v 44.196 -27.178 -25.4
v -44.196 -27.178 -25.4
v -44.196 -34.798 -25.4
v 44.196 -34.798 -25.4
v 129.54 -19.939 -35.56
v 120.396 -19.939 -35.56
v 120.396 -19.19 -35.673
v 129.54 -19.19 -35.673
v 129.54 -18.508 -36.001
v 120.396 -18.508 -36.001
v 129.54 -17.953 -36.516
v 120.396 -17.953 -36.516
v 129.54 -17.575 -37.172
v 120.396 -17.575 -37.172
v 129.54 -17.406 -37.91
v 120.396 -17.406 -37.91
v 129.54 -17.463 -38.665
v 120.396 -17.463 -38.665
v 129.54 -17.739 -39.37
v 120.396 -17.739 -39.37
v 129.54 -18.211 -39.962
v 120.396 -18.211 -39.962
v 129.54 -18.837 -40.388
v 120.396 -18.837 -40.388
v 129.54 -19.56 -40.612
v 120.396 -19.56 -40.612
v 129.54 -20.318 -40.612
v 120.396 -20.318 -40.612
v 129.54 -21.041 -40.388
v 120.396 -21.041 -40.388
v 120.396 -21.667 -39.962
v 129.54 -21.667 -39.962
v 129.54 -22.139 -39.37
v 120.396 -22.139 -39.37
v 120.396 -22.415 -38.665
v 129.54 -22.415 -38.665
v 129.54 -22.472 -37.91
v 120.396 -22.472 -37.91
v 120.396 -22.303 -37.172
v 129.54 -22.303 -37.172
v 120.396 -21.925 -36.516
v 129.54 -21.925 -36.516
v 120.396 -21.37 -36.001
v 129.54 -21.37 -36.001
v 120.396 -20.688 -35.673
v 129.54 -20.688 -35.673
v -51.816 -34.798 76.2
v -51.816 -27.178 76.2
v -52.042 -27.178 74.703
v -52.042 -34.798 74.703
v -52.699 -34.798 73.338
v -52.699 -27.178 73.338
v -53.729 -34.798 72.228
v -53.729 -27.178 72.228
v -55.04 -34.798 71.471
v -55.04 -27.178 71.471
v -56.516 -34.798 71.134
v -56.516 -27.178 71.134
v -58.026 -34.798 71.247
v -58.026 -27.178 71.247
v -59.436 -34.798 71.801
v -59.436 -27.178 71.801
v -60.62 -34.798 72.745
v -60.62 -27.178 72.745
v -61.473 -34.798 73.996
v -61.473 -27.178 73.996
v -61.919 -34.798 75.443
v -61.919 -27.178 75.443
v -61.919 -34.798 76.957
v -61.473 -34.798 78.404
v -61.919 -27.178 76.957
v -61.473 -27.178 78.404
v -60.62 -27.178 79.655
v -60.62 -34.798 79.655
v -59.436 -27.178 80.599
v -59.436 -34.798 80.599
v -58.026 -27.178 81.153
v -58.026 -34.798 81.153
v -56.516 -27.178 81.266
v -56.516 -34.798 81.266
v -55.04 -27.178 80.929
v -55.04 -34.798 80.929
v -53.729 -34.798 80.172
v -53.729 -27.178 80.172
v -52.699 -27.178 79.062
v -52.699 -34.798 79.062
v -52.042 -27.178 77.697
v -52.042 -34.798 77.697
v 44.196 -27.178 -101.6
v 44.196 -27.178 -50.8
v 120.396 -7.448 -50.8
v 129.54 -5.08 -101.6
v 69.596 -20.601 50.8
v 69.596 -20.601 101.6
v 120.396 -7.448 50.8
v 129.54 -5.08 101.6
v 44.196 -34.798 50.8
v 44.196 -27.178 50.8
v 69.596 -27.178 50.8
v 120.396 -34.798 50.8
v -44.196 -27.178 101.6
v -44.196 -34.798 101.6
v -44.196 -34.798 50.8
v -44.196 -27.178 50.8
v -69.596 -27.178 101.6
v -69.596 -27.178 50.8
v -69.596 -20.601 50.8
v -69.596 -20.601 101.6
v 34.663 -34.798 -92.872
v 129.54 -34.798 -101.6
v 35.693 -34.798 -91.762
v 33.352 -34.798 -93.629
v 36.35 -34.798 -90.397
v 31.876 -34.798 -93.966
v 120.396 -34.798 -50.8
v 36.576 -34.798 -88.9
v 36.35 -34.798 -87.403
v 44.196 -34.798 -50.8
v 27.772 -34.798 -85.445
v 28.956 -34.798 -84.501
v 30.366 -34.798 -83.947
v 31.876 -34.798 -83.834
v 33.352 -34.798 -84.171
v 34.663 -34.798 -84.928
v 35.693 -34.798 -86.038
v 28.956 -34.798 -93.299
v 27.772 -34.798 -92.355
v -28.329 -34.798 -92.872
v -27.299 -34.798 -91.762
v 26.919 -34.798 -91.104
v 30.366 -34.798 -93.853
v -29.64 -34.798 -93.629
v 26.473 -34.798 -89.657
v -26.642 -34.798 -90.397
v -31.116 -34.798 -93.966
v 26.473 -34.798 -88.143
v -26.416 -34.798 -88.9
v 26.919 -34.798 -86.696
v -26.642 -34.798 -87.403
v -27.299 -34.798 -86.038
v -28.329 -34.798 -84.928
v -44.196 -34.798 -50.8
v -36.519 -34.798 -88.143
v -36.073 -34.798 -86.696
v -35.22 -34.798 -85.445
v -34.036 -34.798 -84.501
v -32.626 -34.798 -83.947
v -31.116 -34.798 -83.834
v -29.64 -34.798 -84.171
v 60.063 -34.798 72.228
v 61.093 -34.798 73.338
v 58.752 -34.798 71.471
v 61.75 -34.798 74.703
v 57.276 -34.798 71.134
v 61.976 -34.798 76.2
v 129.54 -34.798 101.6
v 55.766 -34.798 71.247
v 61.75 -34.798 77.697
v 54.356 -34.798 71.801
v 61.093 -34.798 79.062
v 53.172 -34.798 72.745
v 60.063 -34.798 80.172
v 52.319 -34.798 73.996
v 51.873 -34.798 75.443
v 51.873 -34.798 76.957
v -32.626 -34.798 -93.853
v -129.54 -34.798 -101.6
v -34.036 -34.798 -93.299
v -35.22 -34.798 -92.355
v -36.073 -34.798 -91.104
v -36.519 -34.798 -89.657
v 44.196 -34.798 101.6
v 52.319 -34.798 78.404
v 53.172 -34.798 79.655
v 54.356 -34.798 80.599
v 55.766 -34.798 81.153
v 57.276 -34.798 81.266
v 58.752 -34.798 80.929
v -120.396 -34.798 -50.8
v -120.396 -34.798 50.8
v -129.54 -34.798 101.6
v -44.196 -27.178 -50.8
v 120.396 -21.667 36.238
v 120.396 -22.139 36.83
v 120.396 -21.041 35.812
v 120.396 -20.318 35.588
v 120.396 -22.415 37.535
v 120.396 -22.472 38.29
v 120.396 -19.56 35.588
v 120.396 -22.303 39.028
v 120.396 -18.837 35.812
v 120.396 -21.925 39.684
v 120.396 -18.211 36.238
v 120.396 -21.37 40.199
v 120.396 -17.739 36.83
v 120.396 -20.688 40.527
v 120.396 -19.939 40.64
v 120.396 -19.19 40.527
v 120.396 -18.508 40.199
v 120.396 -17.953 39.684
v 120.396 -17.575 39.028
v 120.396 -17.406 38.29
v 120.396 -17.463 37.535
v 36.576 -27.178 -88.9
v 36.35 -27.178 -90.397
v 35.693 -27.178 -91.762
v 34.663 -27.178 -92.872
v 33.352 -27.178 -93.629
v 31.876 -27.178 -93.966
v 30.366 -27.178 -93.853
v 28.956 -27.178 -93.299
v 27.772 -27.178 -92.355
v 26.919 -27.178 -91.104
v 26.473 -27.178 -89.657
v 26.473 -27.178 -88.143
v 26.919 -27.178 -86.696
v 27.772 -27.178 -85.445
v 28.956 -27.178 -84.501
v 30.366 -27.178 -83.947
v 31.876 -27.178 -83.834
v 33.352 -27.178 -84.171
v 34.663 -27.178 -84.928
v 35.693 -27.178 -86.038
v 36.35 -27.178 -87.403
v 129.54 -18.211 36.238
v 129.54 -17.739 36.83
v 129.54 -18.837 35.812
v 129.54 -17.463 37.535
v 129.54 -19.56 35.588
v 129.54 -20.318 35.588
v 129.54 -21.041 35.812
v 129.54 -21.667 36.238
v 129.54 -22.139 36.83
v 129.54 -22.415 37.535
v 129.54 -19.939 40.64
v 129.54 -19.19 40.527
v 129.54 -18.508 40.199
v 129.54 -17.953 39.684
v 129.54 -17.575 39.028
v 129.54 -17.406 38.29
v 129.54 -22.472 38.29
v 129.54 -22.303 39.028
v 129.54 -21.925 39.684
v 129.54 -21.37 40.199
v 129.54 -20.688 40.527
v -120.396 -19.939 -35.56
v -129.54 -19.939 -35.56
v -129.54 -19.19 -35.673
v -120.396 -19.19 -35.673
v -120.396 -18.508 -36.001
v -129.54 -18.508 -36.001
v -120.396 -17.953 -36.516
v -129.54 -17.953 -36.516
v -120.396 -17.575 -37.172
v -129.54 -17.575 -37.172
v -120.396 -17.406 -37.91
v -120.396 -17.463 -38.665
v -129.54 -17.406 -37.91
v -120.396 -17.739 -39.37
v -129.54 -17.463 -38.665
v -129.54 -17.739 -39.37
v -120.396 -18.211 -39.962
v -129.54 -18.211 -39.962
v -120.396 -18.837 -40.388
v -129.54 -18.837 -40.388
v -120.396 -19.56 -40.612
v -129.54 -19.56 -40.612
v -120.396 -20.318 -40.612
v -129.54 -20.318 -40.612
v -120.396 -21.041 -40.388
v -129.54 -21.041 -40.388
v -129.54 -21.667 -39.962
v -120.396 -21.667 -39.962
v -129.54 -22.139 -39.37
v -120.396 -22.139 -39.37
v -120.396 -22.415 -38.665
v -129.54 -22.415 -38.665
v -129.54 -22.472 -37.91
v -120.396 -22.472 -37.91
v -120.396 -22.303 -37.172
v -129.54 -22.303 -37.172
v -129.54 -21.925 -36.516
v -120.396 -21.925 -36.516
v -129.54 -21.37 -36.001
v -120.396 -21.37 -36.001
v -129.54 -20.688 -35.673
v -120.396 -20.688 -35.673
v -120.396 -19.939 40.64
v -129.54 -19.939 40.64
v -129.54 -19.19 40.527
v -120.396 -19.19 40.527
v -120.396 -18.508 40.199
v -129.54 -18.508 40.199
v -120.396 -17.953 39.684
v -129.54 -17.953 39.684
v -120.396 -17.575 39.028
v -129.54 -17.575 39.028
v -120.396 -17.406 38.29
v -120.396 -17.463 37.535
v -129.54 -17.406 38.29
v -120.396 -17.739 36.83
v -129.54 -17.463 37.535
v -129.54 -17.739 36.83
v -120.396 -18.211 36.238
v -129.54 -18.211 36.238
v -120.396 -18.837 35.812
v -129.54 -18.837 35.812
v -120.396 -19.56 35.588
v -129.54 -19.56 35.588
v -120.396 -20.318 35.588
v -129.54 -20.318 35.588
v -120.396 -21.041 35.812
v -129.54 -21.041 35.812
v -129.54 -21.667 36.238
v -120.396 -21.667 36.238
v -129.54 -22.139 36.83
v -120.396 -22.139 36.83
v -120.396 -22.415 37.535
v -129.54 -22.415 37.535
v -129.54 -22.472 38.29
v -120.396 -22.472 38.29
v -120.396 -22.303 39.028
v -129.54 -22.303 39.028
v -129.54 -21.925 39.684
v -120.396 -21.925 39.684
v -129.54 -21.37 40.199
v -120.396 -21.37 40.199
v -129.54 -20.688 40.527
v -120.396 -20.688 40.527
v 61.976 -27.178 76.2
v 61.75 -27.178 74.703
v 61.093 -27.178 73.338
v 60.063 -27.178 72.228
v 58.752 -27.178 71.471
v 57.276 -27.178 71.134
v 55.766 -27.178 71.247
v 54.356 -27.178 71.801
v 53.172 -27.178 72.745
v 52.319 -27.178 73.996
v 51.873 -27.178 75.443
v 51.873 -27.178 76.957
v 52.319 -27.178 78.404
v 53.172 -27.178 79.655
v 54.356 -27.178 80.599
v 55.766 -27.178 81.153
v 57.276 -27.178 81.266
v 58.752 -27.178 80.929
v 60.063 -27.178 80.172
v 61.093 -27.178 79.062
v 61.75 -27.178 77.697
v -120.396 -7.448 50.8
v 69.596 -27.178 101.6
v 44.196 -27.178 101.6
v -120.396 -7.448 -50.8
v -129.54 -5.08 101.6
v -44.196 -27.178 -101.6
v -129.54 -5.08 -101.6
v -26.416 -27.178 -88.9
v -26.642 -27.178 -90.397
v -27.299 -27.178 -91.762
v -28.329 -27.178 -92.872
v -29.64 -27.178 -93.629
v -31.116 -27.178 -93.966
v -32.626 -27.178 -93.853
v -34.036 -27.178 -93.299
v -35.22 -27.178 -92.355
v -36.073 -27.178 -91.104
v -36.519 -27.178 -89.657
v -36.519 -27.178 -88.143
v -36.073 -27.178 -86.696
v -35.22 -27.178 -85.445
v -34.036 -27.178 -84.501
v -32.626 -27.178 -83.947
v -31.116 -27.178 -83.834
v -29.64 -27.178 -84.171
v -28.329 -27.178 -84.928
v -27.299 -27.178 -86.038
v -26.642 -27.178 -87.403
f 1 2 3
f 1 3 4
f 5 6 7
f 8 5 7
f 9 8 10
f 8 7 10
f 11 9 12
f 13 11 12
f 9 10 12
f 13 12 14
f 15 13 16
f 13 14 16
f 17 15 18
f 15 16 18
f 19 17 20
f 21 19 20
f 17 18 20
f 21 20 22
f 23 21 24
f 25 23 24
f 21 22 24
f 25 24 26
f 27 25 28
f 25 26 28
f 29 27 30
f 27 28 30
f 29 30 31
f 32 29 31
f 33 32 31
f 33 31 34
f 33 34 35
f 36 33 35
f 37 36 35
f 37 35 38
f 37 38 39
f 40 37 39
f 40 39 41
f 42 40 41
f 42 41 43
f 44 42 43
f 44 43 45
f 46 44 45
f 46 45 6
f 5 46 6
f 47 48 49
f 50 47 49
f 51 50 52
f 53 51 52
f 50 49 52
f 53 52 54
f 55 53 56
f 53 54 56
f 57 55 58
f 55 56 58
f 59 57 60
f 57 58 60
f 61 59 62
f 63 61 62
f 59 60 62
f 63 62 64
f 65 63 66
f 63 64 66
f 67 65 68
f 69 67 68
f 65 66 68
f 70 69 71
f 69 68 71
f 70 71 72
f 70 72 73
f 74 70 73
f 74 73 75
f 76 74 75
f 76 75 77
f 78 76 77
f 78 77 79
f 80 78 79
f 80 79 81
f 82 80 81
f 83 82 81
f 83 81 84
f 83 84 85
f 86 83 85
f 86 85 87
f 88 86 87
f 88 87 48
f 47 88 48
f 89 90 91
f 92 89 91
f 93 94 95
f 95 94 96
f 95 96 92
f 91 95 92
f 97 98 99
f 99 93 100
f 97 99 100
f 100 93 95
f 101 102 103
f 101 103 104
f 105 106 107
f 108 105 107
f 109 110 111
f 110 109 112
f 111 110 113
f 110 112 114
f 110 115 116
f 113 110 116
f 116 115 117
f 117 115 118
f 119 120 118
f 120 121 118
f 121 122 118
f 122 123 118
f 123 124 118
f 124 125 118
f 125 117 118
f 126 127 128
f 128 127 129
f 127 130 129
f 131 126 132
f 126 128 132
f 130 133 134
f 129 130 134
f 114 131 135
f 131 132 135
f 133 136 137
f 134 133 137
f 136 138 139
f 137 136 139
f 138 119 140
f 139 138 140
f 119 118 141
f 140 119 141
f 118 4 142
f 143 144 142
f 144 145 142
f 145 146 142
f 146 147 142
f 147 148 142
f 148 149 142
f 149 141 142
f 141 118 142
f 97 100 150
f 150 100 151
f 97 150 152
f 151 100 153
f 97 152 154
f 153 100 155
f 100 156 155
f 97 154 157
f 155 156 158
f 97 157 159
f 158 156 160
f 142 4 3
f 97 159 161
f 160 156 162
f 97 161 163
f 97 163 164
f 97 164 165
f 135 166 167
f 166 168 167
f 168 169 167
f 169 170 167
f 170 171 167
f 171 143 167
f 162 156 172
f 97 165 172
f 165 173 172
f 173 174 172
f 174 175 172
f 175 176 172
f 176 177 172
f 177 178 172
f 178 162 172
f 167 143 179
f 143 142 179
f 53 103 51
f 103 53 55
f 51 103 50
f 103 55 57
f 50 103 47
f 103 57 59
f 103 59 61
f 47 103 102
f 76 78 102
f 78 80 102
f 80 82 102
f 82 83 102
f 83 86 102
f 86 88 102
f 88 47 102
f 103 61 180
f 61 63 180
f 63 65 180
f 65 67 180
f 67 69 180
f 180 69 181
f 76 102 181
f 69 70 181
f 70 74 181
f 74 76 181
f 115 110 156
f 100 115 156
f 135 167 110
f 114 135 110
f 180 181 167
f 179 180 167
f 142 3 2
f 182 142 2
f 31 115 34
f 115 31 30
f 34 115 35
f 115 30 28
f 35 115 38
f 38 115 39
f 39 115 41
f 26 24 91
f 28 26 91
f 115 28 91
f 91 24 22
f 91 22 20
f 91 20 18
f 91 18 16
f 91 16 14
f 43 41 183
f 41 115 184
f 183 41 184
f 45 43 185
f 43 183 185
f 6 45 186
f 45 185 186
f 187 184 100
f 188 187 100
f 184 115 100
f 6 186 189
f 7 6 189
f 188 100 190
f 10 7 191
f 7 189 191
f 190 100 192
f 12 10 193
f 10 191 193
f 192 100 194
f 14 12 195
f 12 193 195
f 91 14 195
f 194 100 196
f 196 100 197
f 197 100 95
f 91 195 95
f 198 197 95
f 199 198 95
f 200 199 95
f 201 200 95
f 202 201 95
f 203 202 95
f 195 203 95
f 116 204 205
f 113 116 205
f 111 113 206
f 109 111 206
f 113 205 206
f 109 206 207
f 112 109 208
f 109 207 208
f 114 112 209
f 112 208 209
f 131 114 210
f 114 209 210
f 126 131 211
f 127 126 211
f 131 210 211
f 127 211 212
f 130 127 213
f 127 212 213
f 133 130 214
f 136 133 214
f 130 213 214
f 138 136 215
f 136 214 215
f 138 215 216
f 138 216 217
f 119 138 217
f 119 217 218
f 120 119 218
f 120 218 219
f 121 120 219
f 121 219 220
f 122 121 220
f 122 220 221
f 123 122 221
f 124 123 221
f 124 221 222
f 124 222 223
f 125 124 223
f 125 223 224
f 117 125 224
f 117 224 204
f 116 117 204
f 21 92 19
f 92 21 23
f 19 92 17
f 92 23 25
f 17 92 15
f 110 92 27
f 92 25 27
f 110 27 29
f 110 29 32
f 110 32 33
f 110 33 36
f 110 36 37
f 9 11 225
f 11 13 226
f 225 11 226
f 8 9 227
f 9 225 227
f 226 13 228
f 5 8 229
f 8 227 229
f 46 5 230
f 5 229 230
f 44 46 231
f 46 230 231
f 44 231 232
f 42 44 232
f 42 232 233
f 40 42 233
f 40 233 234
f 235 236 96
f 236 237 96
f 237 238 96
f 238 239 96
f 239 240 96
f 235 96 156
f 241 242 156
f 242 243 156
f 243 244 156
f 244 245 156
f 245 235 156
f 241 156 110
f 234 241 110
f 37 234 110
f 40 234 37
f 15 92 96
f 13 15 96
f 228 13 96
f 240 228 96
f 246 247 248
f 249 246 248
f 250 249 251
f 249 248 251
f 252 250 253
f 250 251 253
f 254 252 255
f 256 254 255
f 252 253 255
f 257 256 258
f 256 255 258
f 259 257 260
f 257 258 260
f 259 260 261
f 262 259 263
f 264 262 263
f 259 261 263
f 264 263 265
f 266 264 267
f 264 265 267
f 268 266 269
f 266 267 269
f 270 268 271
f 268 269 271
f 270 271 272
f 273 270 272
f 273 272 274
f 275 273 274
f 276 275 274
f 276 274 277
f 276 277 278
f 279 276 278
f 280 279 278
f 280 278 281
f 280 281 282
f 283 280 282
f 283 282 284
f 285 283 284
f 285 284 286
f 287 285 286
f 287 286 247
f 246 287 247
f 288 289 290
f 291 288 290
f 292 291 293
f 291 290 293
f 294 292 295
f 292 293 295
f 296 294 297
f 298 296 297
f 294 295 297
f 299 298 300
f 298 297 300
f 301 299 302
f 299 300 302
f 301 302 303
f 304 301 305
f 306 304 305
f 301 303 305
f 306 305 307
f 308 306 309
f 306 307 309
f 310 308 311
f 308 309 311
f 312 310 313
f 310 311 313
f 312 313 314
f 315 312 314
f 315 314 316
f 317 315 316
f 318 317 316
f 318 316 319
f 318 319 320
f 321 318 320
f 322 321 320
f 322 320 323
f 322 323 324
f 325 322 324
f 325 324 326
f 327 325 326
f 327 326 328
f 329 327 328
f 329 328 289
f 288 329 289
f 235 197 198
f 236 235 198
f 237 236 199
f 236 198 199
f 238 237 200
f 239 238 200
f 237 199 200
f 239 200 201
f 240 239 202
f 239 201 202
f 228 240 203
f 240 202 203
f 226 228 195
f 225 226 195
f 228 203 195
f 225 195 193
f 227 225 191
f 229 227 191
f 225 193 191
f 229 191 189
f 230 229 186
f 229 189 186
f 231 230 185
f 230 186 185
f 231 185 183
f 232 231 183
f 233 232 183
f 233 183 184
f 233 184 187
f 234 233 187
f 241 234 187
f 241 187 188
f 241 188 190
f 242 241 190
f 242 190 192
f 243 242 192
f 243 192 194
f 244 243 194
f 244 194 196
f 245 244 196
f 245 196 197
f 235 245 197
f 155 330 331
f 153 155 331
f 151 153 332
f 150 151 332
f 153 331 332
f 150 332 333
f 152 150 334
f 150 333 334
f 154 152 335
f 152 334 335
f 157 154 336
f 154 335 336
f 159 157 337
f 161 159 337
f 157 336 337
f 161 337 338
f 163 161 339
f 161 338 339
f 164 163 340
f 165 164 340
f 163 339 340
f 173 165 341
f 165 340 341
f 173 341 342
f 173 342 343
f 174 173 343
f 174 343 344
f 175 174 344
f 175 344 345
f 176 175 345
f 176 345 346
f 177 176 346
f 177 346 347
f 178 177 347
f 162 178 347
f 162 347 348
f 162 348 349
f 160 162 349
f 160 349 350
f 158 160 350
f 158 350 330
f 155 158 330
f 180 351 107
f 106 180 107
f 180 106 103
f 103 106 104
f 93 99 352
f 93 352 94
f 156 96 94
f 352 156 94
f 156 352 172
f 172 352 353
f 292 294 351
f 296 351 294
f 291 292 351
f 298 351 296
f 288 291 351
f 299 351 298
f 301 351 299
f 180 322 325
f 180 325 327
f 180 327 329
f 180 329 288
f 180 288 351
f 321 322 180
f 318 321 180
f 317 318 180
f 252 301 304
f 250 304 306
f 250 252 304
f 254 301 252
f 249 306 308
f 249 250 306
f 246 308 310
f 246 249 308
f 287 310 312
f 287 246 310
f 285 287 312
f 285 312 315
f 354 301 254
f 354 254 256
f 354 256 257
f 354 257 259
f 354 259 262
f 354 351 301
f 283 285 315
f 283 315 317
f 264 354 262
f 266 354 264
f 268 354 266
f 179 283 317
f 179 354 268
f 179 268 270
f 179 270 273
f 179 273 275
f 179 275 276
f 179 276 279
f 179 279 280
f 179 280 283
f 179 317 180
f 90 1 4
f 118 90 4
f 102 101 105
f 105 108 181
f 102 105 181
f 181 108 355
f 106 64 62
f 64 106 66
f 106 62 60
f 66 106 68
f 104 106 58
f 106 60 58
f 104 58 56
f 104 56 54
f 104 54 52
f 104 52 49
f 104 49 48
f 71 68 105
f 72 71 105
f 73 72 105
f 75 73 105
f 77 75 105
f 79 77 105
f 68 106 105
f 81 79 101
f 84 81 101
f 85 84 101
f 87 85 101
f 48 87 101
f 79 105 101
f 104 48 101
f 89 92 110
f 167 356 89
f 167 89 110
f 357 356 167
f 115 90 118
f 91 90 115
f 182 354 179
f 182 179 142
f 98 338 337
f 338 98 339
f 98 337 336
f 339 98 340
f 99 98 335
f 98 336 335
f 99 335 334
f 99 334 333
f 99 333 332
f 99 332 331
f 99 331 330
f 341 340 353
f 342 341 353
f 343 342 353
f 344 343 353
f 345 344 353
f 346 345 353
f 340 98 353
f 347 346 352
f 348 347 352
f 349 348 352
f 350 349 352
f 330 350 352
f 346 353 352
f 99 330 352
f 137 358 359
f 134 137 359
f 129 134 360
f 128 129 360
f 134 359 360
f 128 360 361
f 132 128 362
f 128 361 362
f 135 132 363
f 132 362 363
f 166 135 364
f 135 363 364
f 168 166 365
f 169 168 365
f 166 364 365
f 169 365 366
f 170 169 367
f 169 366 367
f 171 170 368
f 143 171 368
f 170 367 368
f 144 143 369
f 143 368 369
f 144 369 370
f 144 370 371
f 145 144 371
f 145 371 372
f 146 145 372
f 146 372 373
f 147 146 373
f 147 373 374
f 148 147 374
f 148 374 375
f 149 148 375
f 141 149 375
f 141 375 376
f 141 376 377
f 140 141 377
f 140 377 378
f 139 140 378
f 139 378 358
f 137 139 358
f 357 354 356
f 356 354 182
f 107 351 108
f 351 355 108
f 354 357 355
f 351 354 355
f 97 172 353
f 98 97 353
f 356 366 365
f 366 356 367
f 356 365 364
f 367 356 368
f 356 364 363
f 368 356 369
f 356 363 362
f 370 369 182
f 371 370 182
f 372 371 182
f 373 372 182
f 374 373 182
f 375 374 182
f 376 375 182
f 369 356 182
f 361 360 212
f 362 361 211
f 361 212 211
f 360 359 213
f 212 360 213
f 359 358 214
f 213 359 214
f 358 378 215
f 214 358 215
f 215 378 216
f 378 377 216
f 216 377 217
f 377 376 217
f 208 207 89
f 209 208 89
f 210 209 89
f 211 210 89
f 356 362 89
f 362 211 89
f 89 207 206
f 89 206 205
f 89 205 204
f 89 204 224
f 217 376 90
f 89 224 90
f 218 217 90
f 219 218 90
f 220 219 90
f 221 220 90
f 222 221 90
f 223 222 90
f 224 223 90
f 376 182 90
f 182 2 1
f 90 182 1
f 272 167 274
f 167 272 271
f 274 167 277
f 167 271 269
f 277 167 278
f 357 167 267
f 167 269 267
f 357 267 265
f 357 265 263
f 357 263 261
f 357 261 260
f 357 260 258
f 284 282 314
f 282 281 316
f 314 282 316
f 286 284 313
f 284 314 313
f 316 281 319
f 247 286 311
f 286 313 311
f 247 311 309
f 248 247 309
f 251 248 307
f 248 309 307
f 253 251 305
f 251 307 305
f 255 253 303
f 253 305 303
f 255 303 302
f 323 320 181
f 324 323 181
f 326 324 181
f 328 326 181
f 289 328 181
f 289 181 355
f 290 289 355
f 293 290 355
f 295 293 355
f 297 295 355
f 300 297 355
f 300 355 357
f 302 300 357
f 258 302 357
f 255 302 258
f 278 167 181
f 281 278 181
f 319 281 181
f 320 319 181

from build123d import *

# Parameters (mm, degrees)
SKETCH1_W                = 259.08
SKETCH1_H                = 298.45
BOSS_EXTRUDE3_DEPTH      = 14.732
SKETCH2_W                = 259.08
SKETCH2_H                = 298.45
BOSS_EXTRUDE4_DEPTH      = 22.098
SKETCH4_OUTSIDE_W        = 379.836
SKETCH4_OUTSIDE_H        = 118.216
CUT_EXTRUDE2_DEPTH       = 259.08
SKETCH6_OUTSIDE_W        = 340.466
SKETCH6_OUTSIDE_H        = 118.216
CUT_EXTRUDE4_DEPTH       = 298.45
BOSS_EXTRUDE6_DEPTH      = 101.6
BOSS_EXTRUDE6_DEPTH_BACK = 101.6
SKETCH8_W                = 88.392
SKETCH8_H                = 7.62
CUT_EXTRUDE5_DEPTH       = 127
CUT_EXTRUDE7_DEPTH       = 50.8
CUT_EXTRUDE7_DEPTH_BACK  = 50.8
SKETCH15_W               = 25.4
SKETCH15_H               = 6.576785714
CUT_EXTRUDE8_DEPTH       = 53.086
SKETCH16_W               = 25.4
SKETCH16_H               = 6.576785714
CUT_EXTRUDE9_DEPTH       = 53.086
SKETCH17_R               = 5.08
CUT_EXTRUDE10_DEPTH      = 8.62
SKETCH18_R               = 2.54
CUT_EXTRUDE11_DEPTH      = 260.08
SKETCH19_R               = 5.08
CUT_EXTRUDE12_DEPTH      = 8.62
SKETCH21_R               = 5.08
CUT_EXTRUDE13_DEPTH      = 8.62


with BuildPart() as part:
    # Sketch1 → Boss-Extrude3 (new body)
    with BuildSketch(Plane(origin=(0, 0, 0), x_dir=(1, 0, 0), z_dir=(0, 1, 0))):
        Rectangle(SKETCH1_W, SKETCH1_H)
    extrude(amount=BOSS_EXTRUDE3_DEPTH)

    # Sketch2 → Boss-Extrude4 (add)
    with BuildSketch(Plane.XZ):
        Rectangle(SKETCH2_W, SKETCH2_H)
    extrude(amount=BOSS_EXTRUDE4_DEPTH)

    # Sketch4 outside → Cut-Extrude2 (cut)
    with BuildSketch(Plane(origin=(129.54, 0, 0), x_dir=(0, 0, -1), z_dir=(1, 0, 0))):
        with Locations((0, -3.683)):
            Rectangle(SKETCH4_OUTSIDE_W, SKETCH4_OUTSIDE_H)
        Polygon((0, -22.098), (-149.225, 0), (-149.225, 14.732), (149.225, 14.732), (149.225, 0), align=None, mode=Mode.SUBTRACT)
    extrude(amount=-CUT_EXTRUDE2_DEPTH, mode=Mode.SUBTRACT)

    # Sketch6 outside → Cut-Extrude4 (cut)
    with BuildSketch(Plane.XY.offset(149.225)):
        with Locations((0, -3.683)):
            Rectangle(SKETCH6_OUTSIDE_W, SKETCH6_OUTSIDE_H)
        Polygon((-44.196, -22.098), (44.196, -22.098), (129.54, 0), (129.54, 14.732), (-129.54, 14.732), (-129.54, 0), align=None, mode=Mode.SUBTRACT)
    extrude(amount=-CUT_EXTRUDE4_DEPTH, mode=Mode.SUBTRACT)


with BuildPart() as body_2:
    # Sketch7 → Boss-Extrude6 (new body, two sides)
    with BuildSketch(Plane.XY) as boss_extrude6_sk:
        Polygon((44.196, -27.178), (129.54, -5.08), (129.54, -34.798), (-129.54, -34.798), (-129.54, -5.08), (-44.196, -27.178), align=None)
    extrude(amount=BOSS_EXTRUDE6_DEPTH)
    extrude(boss_extrude6_sk.sketch, amount=-BOSS_EXTRUDE6_DEPTH_BACK)

    # Sketch8 → Cut-Extrude5 (cut)
    with BuildSketch(Plane.XY.offset(101.6)):
        with Locations((0, -30.988)):
            Rectangle(SKETCH8_W, SKETCH8_H)
    extrude(amount=-CUT_EXTRUDE5_DEPTH, mode=Mode.SUBTRACT)

    # Sketch10 → Cut-Extrude7 (cut, two sides)
    with BuildSketch(Plane.XY) as cut_extrude7_sk:
        Polygon((-44.196, -27.178), (-120.396, -7.447642857), (-120.396, -34.798), (-44.196, -34.798), align=None)
        Polygon((120.396, -7.447642857), (44.196, -27.178), (44.196, -34.798), (120.396, -34.798), align=None)
    extrude(amount=CUT_EXTRUDE7_DEPTH, mode=Mode.SUBTRACT)
    extrude(cut_extrude7_sk.sketch, amount=-CUT_EXTRUDE7_DEPTH_BACK, mode=Mode.SUBTRACT)

    # Sketch15 → Cut-Extrude8 (cut)
    with BuildSketch(Plane.XY.offset(101.6)):
        with Locations((56.896, -23.889607143)):
            Rectangle(SKETCH15_W, SKETCH15_H)
    extrude(amount=-CUT_EXTRUDE8_DEPTH, mode=Mode.SUBTRACT)

    # Sketch16 → Cut-Extrude9 (cut)
    with BuildSketch(Plane.XY.offset(101.6)):
        with Locations((-56.896, -23.889607143)):
            Rectangle(SKETCH16_W, SKETCH16_H)
    extrude(amount=-CUT_EXTRUDE9_DEPTH, mode=Mode.SUBTRACT)

    # Sketch17 → Cut-Extrude10 (cut, through all)
    with BuildSketch(Plane(origin=(0, -27.178, 0), x_dir=(1, 0, 0), z_dir=(0, 1, 0))):
        with Locations((-31.496, 88.9)):
            Circle(SKETCH17_R)
        with Locations((31.496, 88.9)):
            Circle(SKETCH17_R)
    extrude(amount=-CUT_EXTRUDE10_DEPTH, mode=Mode.SUBTRACT)

    # Sketch18 → Cut-Extrude11 (cut, through all)
    with BuildSketch(Plane.ZY.offset(129.54)):
        with Locations((38.1, -19.939)):
            Circle(SKETCH18_R)
        with Locations((-38.1, -19.939)):
            Circle(SKETCH18_R)
    extrude(amount=-CUT_EXTRUDE11_DEPTH, mode=Mode.SUBTRACT)

    # Sketch19 → Cut-Extrude12 (cut, through all)
    with BuildSketch(Plane(origin=(0, -27.178, 0), x_dir=(1, 0, 0), z_dir=(0, 1, 0))):
        with Locations((-56.896, -76.2)):
            Circle(SKETCH19_R)
    extrude(amount=-CUT_EXTRUDE12_DEPTH, mode=Mode.SUBTRACT)

    # Sketch21 → Cut-Extrude13 (cut, through all)
    with BuildSketch(Plane(origin=(0, -27.178, 0), x_dir=(1, 0, 0), z_dir=(0, 1, 0))):
        with Locations((56.896, -76.2)):
            Circle(SKETCH21_R)
    extrude(amount=-CUT_EXTRUDE13_DEPTH, mode=Mode.SUBTRACT)


solid = body_2.part
